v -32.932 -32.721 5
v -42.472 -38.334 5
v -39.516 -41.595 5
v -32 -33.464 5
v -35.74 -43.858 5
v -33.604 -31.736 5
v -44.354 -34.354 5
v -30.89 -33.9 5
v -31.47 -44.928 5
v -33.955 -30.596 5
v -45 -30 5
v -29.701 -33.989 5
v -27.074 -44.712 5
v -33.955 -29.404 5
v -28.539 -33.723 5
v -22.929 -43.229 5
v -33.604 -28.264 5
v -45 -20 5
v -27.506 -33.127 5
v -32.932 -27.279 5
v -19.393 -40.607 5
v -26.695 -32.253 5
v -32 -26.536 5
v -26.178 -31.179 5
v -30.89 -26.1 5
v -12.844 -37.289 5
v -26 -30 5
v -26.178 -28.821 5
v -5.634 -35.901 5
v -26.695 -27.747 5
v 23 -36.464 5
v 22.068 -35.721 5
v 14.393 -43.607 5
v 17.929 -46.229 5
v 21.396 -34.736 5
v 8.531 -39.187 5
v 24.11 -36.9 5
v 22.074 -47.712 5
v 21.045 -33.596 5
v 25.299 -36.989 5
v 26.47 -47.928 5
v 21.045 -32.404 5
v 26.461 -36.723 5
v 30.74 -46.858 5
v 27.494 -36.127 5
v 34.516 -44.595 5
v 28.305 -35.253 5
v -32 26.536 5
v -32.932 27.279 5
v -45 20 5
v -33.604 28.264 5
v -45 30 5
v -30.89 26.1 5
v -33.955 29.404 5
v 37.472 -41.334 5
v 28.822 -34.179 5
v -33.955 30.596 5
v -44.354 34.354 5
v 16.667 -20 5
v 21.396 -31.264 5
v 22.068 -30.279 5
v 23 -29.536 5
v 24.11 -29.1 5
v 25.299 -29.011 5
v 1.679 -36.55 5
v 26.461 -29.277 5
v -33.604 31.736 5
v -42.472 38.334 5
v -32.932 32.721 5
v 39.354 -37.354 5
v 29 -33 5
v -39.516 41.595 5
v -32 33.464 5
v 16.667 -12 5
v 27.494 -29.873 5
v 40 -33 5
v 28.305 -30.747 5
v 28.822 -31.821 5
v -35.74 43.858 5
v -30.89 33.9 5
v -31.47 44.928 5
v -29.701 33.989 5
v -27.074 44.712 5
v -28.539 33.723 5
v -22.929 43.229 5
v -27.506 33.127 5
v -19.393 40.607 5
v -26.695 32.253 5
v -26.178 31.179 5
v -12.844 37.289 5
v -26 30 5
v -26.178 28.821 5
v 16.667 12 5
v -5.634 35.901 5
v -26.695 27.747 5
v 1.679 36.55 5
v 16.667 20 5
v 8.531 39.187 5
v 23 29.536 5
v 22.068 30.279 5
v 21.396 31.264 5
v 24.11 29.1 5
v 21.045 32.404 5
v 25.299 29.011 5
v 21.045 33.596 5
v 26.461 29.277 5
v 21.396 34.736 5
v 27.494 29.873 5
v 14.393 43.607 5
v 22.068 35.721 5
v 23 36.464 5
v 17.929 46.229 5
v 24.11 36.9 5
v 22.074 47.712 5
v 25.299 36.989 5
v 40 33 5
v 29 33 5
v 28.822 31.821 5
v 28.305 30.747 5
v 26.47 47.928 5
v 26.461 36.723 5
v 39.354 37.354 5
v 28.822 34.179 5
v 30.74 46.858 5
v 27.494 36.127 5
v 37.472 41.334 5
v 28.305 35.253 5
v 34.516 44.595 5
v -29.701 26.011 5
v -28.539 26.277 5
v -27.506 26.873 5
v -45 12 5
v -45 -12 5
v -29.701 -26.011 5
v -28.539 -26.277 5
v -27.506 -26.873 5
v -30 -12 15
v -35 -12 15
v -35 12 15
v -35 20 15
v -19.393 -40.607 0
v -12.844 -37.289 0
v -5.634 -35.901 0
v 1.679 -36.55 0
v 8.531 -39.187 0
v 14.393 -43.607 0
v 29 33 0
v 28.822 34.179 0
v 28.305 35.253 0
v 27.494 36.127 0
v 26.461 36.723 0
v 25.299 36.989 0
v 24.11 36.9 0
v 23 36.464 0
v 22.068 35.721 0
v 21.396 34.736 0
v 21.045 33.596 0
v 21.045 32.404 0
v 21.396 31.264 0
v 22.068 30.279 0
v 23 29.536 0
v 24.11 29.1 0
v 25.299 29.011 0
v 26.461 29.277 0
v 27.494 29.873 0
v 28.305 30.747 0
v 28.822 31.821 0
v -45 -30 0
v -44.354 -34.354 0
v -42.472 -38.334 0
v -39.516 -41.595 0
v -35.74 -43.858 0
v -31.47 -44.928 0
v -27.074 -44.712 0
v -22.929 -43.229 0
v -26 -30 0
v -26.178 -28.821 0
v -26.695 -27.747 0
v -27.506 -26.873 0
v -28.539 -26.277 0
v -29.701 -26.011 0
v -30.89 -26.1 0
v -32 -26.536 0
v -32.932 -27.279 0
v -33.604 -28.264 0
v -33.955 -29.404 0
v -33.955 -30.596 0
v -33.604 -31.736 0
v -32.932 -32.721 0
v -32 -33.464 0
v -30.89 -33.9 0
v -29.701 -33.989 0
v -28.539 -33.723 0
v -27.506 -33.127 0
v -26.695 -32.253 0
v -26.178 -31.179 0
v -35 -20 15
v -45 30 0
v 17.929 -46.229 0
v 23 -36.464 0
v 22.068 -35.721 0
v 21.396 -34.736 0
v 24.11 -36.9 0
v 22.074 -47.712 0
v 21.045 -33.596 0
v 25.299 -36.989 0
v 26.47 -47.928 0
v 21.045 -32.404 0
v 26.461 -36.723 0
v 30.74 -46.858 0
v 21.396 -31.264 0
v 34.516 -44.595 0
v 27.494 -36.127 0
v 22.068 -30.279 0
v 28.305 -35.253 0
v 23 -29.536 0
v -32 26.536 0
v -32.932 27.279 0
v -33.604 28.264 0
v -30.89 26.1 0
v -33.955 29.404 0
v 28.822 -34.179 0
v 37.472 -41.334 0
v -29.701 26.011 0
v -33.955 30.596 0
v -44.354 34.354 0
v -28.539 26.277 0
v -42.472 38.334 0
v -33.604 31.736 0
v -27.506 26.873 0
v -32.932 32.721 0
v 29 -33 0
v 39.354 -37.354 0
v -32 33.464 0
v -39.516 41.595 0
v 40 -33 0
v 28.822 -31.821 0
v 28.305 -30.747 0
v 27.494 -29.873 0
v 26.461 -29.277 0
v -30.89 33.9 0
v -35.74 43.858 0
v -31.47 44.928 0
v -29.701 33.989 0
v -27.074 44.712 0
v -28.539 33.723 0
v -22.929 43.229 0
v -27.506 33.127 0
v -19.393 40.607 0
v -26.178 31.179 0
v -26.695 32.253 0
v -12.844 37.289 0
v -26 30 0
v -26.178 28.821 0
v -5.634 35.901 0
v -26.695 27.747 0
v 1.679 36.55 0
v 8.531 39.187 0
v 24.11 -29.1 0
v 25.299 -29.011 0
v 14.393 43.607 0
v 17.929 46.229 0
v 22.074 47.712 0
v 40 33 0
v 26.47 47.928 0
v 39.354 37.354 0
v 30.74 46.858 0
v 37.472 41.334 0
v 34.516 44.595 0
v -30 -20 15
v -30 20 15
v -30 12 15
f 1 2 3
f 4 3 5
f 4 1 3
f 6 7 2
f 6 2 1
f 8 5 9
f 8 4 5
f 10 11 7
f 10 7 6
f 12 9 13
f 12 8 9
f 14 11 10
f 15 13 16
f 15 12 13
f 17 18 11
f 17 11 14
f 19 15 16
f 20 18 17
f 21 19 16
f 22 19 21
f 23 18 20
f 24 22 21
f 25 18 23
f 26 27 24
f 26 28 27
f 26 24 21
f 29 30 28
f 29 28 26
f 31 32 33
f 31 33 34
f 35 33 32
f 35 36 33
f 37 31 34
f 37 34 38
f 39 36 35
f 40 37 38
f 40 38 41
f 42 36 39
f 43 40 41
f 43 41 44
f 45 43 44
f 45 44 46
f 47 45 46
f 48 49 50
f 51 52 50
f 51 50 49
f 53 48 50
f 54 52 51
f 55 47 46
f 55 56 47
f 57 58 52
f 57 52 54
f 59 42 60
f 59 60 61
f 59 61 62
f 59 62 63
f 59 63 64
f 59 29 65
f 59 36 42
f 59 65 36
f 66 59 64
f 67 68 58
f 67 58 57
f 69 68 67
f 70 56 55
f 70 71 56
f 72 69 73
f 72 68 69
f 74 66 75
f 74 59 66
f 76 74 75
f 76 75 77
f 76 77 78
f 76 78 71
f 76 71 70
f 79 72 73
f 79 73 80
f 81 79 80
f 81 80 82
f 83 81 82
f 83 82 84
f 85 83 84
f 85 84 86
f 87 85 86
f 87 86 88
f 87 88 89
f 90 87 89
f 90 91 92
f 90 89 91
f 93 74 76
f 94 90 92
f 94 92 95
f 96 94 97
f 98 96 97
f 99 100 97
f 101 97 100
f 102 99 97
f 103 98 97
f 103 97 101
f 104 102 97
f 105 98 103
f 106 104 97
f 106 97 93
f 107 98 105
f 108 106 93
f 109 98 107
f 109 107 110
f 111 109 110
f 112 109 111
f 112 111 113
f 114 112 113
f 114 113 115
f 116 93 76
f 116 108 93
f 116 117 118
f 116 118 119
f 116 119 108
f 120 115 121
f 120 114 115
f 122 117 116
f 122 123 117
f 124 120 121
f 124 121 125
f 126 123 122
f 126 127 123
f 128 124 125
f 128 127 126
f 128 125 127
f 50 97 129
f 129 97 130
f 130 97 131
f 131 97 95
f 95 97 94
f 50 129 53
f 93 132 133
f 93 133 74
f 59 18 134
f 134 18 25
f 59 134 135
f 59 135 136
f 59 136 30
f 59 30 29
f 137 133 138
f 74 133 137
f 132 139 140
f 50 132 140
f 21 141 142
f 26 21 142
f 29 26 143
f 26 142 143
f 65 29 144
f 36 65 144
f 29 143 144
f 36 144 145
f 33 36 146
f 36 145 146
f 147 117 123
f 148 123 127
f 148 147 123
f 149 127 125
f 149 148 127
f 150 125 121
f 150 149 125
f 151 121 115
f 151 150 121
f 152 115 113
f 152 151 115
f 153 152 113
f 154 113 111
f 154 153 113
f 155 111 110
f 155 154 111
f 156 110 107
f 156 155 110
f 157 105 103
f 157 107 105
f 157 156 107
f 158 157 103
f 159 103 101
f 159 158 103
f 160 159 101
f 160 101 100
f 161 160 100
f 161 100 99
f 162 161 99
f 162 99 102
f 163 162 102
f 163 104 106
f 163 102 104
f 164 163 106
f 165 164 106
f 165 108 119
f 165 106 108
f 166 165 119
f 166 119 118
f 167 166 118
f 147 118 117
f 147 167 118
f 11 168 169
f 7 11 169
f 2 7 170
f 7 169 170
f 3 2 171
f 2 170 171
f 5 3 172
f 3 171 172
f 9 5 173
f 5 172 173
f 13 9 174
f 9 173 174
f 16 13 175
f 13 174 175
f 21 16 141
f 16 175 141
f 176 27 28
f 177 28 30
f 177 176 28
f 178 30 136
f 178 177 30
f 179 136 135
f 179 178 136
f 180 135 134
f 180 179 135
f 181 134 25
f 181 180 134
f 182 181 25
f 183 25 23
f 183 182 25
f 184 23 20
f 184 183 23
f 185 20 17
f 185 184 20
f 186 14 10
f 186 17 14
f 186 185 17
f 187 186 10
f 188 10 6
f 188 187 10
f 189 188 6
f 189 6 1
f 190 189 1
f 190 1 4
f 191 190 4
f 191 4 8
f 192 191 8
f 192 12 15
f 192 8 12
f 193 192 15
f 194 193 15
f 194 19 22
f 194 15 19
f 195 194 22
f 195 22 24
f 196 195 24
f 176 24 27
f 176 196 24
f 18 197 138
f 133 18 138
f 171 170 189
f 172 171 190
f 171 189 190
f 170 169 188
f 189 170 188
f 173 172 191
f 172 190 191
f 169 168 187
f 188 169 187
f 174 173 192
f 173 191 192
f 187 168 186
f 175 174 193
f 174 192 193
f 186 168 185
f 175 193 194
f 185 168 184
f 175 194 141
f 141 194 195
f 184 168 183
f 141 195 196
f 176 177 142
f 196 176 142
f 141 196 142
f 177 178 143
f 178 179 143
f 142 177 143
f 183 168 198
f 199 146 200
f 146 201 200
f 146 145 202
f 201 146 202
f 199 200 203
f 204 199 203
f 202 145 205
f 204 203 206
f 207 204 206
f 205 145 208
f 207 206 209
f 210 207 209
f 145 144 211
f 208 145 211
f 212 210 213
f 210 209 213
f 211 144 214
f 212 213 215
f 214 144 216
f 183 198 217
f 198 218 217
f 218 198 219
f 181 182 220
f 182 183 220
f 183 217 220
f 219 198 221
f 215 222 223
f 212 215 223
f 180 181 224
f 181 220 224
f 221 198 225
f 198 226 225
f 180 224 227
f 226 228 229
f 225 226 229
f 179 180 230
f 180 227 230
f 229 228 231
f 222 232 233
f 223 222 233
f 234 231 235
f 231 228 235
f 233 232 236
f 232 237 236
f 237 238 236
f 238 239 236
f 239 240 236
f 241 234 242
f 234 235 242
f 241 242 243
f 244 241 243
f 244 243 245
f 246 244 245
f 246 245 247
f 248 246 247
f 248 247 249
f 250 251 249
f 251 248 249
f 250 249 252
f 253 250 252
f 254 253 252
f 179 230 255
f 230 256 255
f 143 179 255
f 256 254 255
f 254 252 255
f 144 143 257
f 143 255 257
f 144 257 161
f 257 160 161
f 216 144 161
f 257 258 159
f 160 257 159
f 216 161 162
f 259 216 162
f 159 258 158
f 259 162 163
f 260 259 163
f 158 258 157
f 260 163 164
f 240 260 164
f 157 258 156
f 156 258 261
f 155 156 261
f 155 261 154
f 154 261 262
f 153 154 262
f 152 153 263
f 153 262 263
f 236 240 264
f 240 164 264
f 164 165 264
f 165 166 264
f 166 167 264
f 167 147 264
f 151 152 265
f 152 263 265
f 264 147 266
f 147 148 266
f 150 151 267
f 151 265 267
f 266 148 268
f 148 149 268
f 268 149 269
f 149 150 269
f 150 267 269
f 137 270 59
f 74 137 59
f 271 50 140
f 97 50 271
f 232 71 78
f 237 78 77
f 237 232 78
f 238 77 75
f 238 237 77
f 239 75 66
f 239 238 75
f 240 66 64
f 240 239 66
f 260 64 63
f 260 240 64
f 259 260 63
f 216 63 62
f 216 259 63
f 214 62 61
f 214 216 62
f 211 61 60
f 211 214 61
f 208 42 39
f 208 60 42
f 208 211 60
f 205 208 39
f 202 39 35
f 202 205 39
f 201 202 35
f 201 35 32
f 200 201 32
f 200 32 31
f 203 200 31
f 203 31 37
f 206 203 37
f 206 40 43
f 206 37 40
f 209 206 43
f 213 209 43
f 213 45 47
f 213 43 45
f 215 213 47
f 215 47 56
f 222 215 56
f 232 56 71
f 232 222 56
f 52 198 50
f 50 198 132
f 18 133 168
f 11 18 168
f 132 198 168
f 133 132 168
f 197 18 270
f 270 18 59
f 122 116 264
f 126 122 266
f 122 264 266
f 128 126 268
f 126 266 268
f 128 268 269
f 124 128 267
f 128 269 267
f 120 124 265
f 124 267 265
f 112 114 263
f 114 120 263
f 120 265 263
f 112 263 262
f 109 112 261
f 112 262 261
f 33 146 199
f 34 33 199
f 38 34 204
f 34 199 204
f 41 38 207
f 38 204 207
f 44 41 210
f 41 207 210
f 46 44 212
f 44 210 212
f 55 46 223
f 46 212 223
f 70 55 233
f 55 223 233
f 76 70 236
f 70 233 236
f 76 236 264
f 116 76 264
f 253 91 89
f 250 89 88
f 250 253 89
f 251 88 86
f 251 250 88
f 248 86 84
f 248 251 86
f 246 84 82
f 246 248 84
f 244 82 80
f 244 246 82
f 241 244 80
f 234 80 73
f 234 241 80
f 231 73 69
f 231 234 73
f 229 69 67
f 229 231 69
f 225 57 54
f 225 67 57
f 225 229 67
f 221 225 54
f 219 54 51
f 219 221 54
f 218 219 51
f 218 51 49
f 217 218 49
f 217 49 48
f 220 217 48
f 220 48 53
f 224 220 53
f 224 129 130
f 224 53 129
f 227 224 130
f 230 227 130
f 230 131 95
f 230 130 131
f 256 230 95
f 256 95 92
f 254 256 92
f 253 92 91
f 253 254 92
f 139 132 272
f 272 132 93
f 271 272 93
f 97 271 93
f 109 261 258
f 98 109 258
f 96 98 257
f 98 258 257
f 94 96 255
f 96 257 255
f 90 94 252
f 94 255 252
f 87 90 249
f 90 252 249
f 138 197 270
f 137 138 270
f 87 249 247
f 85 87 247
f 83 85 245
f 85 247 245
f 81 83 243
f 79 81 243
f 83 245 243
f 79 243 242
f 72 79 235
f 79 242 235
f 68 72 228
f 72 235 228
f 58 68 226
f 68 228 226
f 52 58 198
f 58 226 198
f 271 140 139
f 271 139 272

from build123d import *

# Parameters (mm, degrees)
F1_DEPTH    = 5
F2_R        = 4
F3_DEPTH    = 25
F5_W        = 85
F5_H        = 8
F6_DEPTH    = 15
F7_T4_DEPTH = 371.701063592
F7_T9_DEPTH = 371.701063592
F8_SIZE     = 10


# Not quite as in the source:
# - a fillet or chamfer that OpenCascade refuses, or shapes differently, is made with other operations: its cross-section is extruded or revolved along the edge and cut away or added
# - a feature names something its author has since deleted; it is built from what else it names


with BuildPart() as f1:
    # F0 (on Top) → F1 (new body)
    with BuildSketch(Plane.XY):
        with BuildLine():
            ThreePointArc((-19.3933982822, 40.6066017178), (-16.1418070123, 35.7402514855), (-15, 30))
            ThreePointArc((-15, 30), (-30, 15), (-45, 30))
            Line((-45, 30), (-45, -30))
            ThreePointArc((-45, -30), (-30, -15), (-15, -30))
            ThreePointArc((-15, -30), (-16.1418070123, -35.7402514855), (-19.3933982822, -40.6066017178))
            ThreePointArc((-19.3933982822, -40.6066017178), (-1.9551429216, -35.9702766297), (14.3933982822, -43.6066017178))
            ThreePointArc((14.3933982822, -43.6066017178), (19.2597485145, -19.1418070123), (40, -33))
            Line((40, -33), (40, 33))
            ThreePointArc((40, 33), (19.2597485145, 19.1418070123), (14.3933982822, 43.6066017178))
            ThreePointArc((14.3933982822, 43.6066017178), (-1.9551429216, 35.9702766297), (-19.3933982822, 40.6066017178))
        make_face()
        with BuildLine():
            ThreePointArc((-15, -30), (-30, -15), (-45, -30))
            ThreePointArc((-45, -30), (-35.7402514855, -43.8581929877), (-19.3933982822, -40.6066017178))
            ThreePointArc((-19.3933982822, -40.6066017178), (-16.1418070123, -35.7402514855), (-15, -30))
        make_face()
        with BuildLine():
            ThreePointArc((-45, 30), (-30, 15), (-15, 30))
            ThreePointArc((-15, 30), (-16.1418070123, 35.7402514855), (-19.3933982822, 40.6066017178))
            ThreePointArc((-19.3933982822, 40.6066017178), (-35.7402514855, 43.8581929877), (-45, 30))
        make_face()
        with BuildLine():
            ThreePointArc((40, 33), (30.7402514855, 46.8581929877), (14.3933982822, 43.6066017178))
            ThreePointArc((14.3933982822, 43.6066017178), (19.2597485145, 19.1418070123), (40, 33))
        make_face()
        with BuildLine():
            ThreePointArc((14.3933982822, -43.6066017178), (30.7402514855, -46.8581929877), (40, -33))
            ThreePointArc((40, -33), (19.2597485145, -19.1418070123), (14.3933982822, -43.6066017178))
        make_face()
    extrude(amount=F1_DEPTH)


with BuildPart() as f3:
    # F2 (on Top) → F3 (new body)
    with BuildSketch(Plane.XY):
        with Locations((-30, 30)):
            Circle(F2_R)
    extrude(amount=F3_DEPTH)


with BuildPart() as f3b:
    # F2 (on Top) → F3, piece 2 (new body)
    with BuildSketch(Plane.XY):
        with Locations((25, 33)):
            Circle(F2_R)
    extrude(amount=F3_DEPTH)


with BuildPart() as f3c:
    # F2 (on Top) → F3, piece 3 (new body)
    with BuildSketch(Plane.XY):
        with Locations((25, -33)):
            Circle(F2_R)
    extrude(amount=F3_DEPTH)


with BuildPart() as f3d:
    # F2 (on Top) → F3, piece 4 (new body)
    with BuildSketch(Plane.XY):
        with Locations((-30, -30)):
            Circle(F2_R)
    extrude(amount=F3_DEPTH)


with BuildPart() as f1_1:
    add(f1.part)

    # F4: cut F3, F3b, F3c, F3d
    add(f3.part, mode=Mode.SUBTRACT)
    add(f3b.part, mode=Mode.SUBTRACT)
    add(f3c.part, mode=Mode.SUBTRACT)
    add(f3d.part, mode=Mode.SUBTRACT)

    # F5 (on Top) → F6 (join)
    with BuildSketch(Plane.XY):
        with Locations((-2.5, 16)):
            Rectangle(F5_W, F5_H)
        with Locations((-2.5, -16)):
            Rectangle(F5_W, F5_H)
    extrude(amount=F6_DEPTH)

    # F7: chamfer of 15 x 70 on 2 edges, made by hand


with BuildPart() as f7_tool2:
    # F7_s3 → F7_t4 (new body)
    with BuildSketch(Plane.XZ.offset(169.850531796)):
        Polygon((-30, 15), (40, 0), (40, 15), align=None)
    extrude(amount=-F7_T4_DEPTH)

    split(bisect_by=Plane.XY.offset(5), keep=Keep.TOP)


with BuildPart() as f1_2:
    add(f1_1.part)

    # F7_t1: cut F7_tool2
    add(f7_tool2.part, mode=Mode.SUBTRACT)


with BuildPart() as f7_tool7:
    # F7_s8 → F7_t9 (new body)
    with BuildSketch(Plane.XZ.offset(201.850531796)):
        Polygon((-30, 15), (40, 0), (40, 15), align=None)
    extrude(amount=-F7_T9_DEPTH)

    split(bisect_by=Plane.XY.offset(5), keep=Keep.TOP)


with BuildPart() as f1_3:
    add(f1_2.part)

    # F7_t6: cut F7_tool7
    add(f7_tool7.part, mode=Mode.SUBTRACT)

    # F8
    f8_edges = [f1_3.edges().sort_by_distance(p)[0] for p in [
        (-45, 16, 15),
        (-45, -16, 15),
    ]]
    chamfer(f8_edges, length=F8_SIZE)


solid = f1_3.part
